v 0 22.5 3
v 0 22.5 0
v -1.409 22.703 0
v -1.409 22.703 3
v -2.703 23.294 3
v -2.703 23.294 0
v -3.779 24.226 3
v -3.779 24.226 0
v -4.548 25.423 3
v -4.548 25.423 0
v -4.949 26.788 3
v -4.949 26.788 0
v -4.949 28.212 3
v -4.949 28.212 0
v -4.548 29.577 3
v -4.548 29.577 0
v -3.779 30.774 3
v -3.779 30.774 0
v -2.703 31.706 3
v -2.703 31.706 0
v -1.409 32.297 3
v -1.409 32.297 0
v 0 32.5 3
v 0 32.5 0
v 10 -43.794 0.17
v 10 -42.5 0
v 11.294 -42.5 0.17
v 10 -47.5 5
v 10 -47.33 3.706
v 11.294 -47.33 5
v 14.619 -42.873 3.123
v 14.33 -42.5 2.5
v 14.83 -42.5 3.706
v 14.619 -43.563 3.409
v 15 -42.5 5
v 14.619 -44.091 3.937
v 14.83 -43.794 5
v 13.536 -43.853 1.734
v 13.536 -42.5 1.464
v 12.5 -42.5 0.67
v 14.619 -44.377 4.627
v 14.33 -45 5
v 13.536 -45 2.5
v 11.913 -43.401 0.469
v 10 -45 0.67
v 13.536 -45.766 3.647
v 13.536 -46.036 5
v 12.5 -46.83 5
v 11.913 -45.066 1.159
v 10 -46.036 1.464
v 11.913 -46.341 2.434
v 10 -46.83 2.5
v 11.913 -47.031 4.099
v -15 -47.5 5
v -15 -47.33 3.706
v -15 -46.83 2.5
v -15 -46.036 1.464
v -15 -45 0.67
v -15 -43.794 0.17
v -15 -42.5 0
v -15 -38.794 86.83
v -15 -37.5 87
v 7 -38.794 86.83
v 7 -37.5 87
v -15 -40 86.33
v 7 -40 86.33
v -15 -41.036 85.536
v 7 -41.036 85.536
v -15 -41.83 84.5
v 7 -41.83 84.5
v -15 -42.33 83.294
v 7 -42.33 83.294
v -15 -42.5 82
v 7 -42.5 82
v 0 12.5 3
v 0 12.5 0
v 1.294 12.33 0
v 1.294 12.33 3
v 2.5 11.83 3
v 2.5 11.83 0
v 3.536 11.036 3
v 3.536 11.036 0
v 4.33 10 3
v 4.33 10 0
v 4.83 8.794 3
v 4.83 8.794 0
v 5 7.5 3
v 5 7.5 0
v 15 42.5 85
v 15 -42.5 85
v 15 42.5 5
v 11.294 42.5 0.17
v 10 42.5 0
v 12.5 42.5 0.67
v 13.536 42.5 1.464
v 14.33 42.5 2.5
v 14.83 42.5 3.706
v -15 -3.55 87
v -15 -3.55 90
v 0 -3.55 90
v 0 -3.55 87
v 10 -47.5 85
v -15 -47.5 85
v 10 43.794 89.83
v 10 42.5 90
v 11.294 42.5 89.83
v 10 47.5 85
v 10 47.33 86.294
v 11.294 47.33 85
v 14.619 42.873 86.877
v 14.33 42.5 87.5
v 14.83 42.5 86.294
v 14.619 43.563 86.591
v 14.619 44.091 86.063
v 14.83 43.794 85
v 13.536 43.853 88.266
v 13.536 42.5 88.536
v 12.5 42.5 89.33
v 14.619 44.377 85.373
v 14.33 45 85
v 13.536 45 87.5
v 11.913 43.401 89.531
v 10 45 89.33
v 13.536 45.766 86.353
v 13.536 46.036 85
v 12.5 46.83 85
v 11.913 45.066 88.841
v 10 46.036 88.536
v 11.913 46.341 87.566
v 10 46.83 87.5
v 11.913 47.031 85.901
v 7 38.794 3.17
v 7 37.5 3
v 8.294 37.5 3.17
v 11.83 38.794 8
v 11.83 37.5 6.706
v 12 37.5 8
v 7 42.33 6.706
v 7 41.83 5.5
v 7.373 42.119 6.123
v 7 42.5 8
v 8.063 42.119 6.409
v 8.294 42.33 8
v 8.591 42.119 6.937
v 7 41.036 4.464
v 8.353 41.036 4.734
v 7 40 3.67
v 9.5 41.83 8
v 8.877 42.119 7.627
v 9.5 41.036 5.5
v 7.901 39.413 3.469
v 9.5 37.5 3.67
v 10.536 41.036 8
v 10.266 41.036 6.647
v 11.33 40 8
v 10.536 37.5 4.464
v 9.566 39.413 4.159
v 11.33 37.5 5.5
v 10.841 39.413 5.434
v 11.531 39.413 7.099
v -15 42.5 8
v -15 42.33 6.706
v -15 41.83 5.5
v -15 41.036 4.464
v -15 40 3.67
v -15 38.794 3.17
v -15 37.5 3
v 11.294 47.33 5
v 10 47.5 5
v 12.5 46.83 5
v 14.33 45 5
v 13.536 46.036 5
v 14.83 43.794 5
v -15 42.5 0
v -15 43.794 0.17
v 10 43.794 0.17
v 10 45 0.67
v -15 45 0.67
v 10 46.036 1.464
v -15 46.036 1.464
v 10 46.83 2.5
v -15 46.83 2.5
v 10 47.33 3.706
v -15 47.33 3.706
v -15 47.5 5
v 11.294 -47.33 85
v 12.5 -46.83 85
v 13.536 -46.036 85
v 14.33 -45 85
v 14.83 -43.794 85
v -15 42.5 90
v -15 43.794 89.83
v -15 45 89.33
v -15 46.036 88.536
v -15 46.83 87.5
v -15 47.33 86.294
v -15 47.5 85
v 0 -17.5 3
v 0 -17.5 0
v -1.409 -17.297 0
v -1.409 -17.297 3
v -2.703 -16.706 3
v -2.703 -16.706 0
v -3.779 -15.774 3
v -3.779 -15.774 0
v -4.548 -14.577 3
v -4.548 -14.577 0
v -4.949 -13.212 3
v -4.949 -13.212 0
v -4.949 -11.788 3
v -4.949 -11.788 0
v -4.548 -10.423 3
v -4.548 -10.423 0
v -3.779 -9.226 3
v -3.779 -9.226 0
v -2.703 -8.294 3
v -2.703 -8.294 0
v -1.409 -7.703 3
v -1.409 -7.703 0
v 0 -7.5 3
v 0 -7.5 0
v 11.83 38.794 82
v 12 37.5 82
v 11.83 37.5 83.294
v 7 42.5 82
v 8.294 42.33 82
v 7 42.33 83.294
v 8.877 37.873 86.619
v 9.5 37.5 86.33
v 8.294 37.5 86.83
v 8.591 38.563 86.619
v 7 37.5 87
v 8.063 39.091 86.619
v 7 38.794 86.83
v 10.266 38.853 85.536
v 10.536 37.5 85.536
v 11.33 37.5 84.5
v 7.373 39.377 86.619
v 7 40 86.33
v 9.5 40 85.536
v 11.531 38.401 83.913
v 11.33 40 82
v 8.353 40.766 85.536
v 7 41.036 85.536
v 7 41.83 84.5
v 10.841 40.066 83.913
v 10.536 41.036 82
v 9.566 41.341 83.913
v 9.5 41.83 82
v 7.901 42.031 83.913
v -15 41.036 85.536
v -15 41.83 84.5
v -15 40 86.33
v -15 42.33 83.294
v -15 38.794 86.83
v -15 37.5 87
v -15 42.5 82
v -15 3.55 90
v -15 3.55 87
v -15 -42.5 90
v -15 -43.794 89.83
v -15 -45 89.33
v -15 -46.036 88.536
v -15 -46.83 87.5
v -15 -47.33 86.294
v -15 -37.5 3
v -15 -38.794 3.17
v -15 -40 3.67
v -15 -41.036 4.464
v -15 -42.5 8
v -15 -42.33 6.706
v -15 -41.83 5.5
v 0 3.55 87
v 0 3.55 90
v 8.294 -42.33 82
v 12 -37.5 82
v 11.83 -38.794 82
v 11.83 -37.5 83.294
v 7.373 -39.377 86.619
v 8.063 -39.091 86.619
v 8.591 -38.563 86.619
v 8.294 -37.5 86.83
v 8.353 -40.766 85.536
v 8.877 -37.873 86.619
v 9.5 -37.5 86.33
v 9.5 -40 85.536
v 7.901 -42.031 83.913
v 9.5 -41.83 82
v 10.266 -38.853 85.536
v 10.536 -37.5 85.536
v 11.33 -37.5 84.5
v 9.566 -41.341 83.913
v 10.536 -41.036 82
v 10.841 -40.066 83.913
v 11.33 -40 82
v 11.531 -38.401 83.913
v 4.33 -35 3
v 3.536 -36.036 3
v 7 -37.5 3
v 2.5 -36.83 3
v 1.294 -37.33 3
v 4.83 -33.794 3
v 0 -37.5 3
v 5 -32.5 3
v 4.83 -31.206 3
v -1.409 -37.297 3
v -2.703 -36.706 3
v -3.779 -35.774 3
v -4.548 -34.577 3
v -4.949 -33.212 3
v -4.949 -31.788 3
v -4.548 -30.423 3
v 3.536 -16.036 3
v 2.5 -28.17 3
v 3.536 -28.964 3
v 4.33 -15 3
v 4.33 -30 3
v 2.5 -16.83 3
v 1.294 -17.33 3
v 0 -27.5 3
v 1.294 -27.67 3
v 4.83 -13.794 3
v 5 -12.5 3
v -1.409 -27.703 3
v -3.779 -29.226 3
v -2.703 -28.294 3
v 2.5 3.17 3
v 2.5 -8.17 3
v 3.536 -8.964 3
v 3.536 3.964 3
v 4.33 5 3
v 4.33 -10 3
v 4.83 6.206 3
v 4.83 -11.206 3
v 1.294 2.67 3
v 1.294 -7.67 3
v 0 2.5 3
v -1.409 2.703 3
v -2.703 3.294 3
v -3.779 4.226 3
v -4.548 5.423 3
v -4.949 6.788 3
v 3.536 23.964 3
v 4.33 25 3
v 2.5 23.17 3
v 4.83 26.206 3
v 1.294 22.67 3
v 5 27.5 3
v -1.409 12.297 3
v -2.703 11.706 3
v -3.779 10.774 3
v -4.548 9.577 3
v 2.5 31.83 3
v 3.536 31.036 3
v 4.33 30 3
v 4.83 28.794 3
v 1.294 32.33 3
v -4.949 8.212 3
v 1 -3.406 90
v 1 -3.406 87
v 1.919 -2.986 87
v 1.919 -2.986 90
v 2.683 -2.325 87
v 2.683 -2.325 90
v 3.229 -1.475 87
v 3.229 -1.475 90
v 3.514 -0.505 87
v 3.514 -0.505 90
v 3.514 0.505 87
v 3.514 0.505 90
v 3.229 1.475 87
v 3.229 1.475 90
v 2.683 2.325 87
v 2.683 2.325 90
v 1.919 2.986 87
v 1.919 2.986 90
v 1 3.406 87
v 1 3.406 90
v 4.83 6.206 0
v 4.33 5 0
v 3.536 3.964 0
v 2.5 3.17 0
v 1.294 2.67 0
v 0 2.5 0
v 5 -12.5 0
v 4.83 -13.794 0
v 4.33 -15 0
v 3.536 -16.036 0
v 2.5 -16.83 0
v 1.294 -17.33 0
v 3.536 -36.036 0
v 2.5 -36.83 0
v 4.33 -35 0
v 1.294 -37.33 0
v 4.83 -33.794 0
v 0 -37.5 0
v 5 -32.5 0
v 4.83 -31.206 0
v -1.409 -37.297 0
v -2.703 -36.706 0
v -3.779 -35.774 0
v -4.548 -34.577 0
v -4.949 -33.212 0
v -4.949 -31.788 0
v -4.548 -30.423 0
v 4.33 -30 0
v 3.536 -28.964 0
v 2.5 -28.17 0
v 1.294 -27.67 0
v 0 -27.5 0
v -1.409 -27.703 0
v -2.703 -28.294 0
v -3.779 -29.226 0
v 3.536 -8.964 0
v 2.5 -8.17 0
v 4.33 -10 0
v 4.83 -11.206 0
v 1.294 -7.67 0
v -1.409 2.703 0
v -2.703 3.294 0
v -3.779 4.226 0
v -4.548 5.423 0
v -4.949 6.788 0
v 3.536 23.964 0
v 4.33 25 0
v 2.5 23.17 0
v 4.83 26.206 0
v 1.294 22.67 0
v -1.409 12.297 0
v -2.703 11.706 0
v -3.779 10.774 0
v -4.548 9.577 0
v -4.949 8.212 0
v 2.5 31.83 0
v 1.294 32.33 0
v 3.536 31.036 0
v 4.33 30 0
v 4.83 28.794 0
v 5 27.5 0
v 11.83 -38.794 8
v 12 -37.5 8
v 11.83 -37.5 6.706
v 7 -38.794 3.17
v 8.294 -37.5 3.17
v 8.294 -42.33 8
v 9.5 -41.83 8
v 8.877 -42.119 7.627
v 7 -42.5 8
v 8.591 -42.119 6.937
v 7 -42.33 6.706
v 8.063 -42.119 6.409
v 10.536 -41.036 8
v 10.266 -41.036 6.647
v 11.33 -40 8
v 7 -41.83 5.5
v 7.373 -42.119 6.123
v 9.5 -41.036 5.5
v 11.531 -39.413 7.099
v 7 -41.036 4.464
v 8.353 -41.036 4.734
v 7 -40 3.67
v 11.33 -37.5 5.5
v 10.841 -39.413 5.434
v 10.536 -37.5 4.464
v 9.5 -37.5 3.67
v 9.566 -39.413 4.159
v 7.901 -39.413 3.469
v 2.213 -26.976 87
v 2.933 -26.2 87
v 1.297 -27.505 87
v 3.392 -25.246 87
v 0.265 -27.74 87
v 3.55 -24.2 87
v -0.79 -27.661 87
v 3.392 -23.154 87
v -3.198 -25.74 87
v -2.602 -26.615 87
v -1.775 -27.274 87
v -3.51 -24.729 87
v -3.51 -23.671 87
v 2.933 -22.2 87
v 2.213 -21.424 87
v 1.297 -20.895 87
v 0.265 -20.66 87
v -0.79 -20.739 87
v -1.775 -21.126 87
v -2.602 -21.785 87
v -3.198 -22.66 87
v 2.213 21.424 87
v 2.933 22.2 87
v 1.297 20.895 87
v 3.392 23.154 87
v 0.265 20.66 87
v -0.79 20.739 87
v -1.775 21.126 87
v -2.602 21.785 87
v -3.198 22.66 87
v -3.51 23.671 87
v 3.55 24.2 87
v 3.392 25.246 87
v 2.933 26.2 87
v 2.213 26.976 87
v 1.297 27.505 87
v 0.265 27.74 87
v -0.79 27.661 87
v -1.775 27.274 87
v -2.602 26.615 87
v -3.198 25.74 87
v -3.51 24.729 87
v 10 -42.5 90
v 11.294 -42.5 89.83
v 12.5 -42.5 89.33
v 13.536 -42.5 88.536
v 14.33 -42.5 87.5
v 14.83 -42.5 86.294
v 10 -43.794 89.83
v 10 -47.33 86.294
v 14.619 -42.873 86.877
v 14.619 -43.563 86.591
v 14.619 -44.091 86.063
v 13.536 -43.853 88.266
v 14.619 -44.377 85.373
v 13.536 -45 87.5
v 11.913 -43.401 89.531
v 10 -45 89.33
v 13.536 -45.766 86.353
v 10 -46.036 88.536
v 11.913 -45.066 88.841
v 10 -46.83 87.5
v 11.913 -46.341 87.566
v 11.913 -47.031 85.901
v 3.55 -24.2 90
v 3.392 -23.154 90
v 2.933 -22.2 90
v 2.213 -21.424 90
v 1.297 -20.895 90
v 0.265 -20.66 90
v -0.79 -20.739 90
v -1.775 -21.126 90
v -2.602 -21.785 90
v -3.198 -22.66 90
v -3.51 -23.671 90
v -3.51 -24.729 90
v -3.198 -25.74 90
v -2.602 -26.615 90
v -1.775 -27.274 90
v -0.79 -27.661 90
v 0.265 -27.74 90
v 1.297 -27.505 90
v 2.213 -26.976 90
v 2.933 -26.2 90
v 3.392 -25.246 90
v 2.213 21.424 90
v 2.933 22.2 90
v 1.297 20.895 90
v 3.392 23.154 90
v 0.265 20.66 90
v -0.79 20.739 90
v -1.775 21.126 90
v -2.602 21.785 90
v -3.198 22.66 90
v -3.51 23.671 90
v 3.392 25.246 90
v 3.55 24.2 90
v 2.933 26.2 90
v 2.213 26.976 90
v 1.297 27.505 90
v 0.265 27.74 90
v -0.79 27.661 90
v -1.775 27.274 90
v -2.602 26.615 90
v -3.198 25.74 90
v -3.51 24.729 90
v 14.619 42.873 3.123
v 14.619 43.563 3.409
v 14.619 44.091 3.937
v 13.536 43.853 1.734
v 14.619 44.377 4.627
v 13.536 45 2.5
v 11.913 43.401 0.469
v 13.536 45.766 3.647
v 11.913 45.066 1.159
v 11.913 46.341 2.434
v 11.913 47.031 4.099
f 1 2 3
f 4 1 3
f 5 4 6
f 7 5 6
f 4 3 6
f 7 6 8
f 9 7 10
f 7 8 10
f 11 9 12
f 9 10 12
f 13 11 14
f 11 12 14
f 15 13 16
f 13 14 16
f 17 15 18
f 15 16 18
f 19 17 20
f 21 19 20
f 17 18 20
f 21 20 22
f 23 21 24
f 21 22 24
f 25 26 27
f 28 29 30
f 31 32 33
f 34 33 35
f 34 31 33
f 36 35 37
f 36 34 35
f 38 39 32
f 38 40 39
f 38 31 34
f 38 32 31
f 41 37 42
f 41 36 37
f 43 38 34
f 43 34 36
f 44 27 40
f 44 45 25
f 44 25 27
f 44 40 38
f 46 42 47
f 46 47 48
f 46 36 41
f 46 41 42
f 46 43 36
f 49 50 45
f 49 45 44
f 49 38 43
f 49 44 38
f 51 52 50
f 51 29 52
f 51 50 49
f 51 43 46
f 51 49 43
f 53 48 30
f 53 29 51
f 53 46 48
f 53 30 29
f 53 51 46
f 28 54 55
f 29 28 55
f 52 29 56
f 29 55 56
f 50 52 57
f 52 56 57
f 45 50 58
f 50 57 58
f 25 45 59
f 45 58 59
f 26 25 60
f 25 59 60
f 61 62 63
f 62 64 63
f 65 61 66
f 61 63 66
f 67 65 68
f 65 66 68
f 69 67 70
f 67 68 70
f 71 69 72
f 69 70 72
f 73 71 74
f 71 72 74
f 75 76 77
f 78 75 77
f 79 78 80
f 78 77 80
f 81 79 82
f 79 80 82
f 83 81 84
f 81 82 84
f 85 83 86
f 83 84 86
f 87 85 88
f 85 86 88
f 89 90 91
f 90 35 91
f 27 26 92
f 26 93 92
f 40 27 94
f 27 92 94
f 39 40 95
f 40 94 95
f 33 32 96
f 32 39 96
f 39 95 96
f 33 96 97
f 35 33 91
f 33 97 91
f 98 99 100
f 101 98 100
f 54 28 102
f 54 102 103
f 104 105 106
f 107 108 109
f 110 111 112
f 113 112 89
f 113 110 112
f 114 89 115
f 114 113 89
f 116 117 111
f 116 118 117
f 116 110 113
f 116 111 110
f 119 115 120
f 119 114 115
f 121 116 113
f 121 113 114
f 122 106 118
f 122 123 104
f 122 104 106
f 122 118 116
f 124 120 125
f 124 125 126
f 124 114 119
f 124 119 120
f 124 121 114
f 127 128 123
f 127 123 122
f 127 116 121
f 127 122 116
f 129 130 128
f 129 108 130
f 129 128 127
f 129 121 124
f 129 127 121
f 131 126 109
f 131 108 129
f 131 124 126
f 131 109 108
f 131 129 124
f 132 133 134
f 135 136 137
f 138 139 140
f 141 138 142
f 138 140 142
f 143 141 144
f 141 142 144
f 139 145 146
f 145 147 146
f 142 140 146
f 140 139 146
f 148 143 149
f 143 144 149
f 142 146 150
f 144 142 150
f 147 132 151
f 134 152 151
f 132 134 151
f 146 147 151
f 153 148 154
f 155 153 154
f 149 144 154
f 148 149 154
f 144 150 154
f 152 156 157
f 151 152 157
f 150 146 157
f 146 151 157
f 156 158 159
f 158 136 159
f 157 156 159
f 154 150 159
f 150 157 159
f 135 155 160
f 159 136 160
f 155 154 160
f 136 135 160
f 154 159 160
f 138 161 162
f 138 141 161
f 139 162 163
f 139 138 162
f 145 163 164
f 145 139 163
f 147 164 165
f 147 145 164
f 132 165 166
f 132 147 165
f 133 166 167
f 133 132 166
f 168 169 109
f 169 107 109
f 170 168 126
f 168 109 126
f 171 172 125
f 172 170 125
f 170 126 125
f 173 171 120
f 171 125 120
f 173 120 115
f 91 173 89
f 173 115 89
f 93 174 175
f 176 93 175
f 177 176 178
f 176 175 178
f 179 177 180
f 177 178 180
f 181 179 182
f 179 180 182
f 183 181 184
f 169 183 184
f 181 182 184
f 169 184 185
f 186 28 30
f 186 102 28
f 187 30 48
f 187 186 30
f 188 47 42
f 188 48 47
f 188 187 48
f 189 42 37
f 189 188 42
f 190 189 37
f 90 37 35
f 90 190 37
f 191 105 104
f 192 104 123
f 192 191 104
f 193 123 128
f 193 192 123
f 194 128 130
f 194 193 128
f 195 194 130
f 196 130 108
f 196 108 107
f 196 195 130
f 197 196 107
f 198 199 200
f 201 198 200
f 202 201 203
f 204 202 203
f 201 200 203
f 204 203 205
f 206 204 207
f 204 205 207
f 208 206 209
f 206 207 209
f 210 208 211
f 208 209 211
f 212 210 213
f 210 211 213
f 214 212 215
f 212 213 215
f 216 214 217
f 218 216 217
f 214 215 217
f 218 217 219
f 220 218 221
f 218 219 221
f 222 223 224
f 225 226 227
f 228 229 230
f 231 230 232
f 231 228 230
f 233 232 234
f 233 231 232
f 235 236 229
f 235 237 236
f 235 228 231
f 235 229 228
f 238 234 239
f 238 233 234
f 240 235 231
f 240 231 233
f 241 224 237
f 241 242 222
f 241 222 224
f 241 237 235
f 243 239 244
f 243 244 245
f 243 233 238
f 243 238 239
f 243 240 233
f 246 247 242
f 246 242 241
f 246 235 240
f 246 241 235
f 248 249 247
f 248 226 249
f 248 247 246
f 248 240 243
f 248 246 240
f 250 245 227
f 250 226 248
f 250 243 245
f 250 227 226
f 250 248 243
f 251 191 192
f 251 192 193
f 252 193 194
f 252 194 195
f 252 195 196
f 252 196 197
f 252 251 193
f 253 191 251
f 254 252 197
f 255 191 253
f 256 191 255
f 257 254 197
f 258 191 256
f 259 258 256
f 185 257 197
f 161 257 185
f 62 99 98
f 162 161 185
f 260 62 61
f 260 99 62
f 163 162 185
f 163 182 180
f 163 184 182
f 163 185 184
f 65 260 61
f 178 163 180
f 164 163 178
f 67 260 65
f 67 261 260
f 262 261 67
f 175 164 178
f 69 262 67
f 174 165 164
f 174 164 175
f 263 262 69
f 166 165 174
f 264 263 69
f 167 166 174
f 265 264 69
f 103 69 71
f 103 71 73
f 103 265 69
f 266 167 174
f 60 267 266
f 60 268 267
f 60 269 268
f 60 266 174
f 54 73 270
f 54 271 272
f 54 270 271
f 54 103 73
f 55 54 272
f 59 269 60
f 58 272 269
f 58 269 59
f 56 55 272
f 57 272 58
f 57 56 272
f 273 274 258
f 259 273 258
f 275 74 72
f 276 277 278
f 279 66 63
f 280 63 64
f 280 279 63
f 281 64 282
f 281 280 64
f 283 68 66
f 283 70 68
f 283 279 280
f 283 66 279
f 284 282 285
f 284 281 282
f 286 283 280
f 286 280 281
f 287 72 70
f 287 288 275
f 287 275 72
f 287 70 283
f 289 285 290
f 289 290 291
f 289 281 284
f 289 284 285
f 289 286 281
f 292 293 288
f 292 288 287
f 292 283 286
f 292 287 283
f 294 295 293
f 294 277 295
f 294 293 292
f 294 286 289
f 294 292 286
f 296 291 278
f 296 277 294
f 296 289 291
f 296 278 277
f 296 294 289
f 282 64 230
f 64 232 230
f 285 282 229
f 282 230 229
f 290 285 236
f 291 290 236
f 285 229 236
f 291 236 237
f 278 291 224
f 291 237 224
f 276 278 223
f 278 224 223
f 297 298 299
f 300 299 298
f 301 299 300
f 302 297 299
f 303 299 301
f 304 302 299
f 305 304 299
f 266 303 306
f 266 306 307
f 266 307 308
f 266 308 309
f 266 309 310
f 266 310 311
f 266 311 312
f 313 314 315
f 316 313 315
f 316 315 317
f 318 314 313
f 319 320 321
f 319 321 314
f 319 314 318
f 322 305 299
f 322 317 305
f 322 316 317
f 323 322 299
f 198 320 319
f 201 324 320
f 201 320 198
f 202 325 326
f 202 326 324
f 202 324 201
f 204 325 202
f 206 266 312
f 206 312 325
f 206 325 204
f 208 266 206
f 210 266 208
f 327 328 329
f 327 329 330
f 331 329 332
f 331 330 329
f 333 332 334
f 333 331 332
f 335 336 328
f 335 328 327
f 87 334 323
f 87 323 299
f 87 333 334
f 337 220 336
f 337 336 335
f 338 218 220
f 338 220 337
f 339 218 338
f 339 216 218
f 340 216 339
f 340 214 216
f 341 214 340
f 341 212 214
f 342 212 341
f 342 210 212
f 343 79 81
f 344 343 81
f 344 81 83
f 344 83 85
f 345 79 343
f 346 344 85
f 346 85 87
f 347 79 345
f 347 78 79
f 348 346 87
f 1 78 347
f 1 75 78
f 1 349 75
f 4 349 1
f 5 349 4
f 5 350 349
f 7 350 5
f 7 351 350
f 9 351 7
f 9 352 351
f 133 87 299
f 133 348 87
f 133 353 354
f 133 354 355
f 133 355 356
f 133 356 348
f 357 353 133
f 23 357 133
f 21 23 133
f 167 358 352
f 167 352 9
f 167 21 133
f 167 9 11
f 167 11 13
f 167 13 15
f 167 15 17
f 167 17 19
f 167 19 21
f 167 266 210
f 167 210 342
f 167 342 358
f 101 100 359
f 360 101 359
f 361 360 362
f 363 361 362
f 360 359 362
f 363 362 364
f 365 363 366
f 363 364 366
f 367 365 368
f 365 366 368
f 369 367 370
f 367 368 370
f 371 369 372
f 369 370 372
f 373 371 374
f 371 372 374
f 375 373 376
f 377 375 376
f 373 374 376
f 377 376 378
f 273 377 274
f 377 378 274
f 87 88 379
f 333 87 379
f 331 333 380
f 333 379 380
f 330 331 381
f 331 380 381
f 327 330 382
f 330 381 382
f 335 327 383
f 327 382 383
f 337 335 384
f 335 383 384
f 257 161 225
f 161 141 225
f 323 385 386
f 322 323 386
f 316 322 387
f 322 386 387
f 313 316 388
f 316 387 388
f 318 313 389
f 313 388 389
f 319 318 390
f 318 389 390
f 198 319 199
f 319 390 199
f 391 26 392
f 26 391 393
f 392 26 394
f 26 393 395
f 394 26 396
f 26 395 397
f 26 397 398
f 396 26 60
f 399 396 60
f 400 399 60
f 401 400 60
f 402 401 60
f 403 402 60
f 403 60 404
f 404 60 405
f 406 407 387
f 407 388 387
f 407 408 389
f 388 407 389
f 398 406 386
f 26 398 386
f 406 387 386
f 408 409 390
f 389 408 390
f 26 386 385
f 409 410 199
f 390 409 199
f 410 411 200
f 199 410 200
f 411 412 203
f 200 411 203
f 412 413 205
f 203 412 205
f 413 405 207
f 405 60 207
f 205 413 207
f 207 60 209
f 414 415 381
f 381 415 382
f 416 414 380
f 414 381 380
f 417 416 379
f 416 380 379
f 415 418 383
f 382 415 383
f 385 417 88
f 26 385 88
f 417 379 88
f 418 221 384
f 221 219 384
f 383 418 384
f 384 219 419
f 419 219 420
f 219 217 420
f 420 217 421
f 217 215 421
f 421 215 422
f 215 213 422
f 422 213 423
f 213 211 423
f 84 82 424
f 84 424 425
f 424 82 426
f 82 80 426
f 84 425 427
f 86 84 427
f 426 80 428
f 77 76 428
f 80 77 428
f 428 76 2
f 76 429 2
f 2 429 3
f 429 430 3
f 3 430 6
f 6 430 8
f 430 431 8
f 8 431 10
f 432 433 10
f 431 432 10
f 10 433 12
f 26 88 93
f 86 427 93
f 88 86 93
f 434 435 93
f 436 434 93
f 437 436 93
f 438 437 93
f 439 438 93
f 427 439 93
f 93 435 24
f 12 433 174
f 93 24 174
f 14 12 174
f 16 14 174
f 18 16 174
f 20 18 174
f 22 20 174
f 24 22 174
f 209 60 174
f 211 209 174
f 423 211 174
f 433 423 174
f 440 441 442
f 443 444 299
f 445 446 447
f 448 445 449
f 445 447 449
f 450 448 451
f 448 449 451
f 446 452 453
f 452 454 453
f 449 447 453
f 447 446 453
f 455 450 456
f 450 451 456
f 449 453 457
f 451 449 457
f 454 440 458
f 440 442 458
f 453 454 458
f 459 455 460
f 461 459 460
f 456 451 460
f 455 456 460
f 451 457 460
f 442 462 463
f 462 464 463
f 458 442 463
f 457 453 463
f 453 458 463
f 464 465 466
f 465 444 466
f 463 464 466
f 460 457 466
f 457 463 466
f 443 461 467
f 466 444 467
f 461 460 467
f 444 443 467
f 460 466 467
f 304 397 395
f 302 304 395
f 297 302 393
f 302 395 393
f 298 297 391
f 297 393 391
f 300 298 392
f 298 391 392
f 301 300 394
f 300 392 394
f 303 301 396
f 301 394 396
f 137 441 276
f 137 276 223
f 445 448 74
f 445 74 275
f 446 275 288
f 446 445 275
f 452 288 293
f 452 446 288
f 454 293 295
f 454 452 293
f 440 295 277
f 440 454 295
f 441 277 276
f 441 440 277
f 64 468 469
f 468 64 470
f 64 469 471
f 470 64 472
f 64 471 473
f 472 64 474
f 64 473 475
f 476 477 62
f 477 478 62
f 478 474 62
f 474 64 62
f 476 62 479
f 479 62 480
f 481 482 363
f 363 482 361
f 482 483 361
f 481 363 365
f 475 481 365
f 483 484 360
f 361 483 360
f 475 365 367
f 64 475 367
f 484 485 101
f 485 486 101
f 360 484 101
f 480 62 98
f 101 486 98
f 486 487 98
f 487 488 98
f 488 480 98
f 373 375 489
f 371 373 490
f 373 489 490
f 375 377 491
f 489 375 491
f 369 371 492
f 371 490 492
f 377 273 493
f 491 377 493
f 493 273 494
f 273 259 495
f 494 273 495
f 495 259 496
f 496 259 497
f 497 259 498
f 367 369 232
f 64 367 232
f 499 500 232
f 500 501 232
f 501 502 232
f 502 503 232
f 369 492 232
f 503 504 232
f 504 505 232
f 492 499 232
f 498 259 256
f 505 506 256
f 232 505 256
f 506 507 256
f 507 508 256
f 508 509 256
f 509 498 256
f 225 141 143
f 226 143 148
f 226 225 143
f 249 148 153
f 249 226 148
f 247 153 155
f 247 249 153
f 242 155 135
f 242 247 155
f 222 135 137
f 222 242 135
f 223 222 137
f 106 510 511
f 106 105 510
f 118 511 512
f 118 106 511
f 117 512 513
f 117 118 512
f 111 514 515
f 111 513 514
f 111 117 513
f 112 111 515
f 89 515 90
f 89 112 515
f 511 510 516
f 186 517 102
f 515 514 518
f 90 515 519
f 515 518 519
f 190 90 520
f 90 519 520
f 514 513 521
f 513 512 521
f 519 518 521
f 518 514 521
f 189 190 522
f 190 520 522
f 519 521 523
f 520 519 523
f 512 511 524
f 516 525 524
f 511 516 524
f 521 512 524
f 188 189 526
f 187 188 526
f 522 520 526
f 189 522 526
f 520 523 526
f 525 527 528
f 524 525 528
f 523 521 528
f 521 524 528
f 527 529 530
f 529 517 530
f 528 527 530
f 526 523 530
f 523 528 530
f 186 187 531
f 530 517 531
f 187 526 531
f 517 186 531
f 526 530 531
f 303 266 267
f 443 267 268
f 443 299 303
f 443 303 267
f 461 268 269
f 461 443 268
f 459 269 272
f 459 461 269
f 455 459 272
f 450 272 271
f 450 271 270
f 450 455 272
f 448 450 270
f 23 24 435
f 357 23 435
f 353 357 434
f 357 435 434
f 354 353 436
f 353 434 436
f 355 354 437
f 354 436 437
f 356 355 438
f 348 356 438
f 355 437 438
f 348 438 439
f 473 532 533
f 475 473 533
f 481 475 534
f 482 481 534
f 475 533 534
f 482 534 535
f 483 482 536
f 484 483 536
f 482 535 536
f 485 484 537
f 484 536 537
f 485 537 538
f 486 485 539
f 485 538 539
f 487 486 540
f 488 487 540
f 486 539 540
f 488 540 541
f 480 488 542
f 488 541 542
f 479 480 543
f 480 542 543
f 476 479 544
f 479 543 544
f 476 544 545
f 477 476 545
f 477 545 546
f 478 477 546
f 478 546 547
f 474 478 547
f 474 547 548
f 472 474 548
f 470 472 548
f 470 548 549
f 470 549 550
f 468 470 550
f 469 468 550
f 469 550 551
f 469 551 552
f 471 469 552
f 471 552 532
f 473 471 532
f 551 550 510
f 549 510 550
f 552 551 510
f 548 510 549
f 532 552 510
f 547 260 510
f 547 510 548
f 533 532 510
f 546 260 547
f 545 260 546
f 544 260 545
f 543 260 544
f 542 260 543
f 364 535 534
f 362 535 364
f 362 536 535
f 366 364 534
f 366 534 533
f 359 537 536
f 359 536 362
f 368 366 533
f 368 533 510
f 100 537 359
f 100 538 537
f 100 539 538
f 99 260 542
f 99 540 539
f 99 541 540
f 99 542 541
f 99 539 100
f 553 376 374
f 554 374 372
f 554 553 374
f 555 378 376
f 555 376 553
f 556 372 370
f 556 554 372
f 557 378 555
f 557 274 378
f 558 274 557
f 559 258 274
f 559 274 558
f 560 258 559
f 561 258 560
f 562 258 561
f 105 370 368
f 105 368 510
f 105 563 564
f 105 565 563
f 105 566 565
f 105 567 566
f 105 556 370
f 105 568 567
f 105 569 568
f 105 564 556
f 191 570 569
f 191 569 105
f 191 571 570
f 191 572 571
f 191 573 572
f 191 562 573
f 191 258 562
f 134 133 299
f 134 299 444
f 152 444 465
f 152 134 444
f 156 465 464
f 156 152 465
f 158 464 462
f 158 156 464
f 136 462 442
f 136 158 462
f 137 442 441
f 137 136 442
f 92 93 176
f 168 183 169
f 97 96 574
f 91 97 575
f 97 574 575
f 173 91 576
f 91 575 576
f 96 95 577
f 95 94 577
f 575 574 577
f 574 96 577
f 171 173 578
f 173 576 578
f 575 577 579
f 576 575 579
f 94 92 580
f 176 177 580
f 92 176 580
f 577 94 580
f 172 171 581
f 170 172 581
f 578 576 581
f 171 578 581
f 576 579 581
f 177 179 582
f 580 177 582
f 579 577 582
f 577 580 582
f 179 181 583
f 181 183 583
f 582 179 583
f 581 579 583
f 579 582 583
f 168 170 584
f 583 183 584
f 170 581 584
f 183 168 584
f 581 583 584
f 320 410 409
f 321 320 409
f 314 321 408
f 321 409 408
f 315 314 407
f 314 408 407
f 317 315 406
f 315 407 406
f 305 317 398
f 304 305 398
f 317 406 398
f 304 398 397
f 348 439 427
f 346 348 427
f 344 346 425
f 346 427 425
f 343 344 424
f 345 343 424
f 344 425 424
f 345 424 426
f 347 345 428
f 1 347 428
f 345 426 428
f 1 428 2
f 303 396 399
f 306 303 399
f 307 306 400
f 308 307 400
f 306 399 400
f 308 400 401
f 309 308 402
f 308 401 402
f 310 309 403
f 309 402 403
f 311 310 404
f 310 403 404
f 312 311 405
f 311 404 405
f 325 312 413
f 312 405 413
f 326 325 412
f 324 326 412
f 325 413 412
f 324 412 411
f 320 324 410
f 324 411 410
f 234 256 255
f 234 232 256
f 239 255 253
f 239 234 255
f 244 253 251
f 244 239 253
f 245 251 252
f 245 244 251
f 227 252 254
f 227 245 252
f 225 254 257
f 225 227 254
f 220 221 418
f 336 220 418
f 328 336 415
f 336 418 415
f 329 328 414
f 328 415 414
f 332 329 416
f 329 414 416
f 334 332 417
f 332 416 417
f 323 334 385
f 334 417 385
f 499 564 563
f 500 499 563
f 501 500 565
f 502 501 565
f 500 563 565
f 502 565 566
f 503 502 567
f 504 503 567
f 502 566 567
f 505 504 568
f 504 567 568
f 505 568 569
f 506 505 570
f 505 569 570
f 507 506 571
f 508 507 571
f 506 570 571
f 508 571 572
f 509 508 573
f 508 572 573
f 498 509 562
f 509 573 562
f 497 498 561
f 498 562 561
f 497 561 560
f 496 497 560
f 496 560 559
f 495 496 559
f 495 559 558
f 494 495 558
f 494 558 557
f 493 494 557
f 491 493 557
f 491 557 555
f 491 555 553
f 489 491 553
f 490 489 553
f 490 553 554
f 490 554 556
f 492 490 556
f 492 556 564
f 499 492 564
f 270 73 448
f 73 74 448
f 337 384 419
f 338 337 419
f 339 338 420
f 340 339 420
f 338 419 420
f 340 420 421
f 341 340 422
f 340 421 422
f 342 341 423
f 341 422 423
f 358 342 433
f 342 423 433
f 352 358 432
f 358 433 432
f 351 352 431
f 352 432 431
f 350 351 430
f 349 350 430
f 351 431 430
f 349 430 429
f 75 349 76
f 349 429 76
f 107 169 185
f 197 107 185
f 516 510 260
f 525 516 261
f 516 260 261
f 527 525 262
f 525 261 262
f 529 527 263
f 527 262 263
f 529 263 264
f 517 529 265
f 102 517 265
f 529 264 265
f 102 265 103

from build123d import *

# Parameters (mm, degrees)
SKETCH1_W                                   = 95
SKETCH1_H                                   = 30
BOSS_EXTRUDE1_DEPTH                         = 90
F_2_MM_TOP_BOT_3_MM_SIDE_T                  = -3
F_2_MM_TOP_BOT_3_MM_SIDE_THICKNESS_2_FACE_W = 84
F_2_MM_TOP_BOT_3_MM_SIDE_THICKNESS_2_FACE_H = 27
F_2_MM_TOP_BOT_3_MM_SIDE_THICKNESS_2_DEPTH  = 2
F_2_MM_TOP_BOT_3_MM_SIDE_THICKNESS_3_FACE_W = 84
F_2_MM_TOP_BOT_3_MM_SIDE_THICKNESS_3_FACE_H = 27
F_2_MM_TOP_BOT_3_MM_SIDE_THICKNESS_3_DEPTH  = 2
SKETCH4_R                                   = 3.55
F_7_1_MM_FIXTURE_HOLES_DEPTH                = 10
F_5_MM_RADIUS_R                             = 5
CUT_EXTRUDE1_DEPTH                          = 10


with BuildPart() as part:
    # Sketch1 → Boss-Extrude1 (new body)
    with BuildSketch(Plane(origin=(0, 0, 0), x_dir=(0, 1, 0), z_dir=(0, 0, 1))):
        Rectangle(SKETCH1_W, SKETCH1_H)
    extrude(amount=BOSS_EXTRUDE1_DEPTH)

    # 2 mm top/bot 3 mm side
    f_2_mm_top_bot_3_mm_side_openings = [part.faces().sort_by_distance(p)[0] for p in [
        (-15, 0, 45),
    ]]
    offset(amount=F_2_MM_TOP_BOT_3_MM_SIDE_T, openings=f_2_mm_top_bot_3_mm_side_openings, kind=Kind.INTERSECTION)

    # 2 mm top/bot 3 mm side thickness 2 face (on inner face of the shell) → 2 mm top/bot 3 mm side thickness 2 (add)
    with BuildSketch(Plane(origin=(-1.5, 44.5, 45), x_dir=(0, 0, 1), z_dir=(0, 1, 0))):
        Rectangle(F_2_MM_TOP_BOT_3_MM_SIDE_THICKNESS_2_FACE_W, F_2_MM_TOP_BOT_3_MM_SIDE_THICKNESS_2_FACE_H)
    extrude(amount=-F_2_MM_TOP_BOT_3_MM_SIDE_THICKNESS_2_DEPTH)

    # 2 mm top/bot 3 mm side thickness 3 face (on inner face of the shell) → 2 mm top/bot 3 mm side thickness 3 (add)
    with BuildSketch(Plane(origin=(-1.5, -44.5, 45), x_dir=(0, 0, -1), z_dir=(0, -1, 0))):
        Rectangle(F_2_MM_TOP_BOT_3_MM_SIDE_THICKNESS_3_FACE_W, F_2_MM_TOP_BOT_3_MM_SIDE_THICKNESS_3_FACE_H)
    extrude(amount=-F_2_MM_TOP_BOT_3_MM_SIDE_THICKNESS_3_DEPTH)

    # Sketch4 → 7.1 mm fixture holes (cut)
    with BuildSketch(Plane.XY.offset(90)):
        with Locations((0, 24.2)):
            Circle(SKETCH4_R)
        Circle(SKETCH4_R)
        with Locations((0, -24.2)):
            Circle(SKETCH4_R)
        with BuildLine():
            ThreePointArc((0, -3.55), (-3.55, 0), (0, 3.55))
            Line((0, 3.55), (-15, 3.55))
            Line((-15, 3.55), (-15, -3.55))
            Line((-15, -3.55), (0, -3.55))
        make_face()
    extrude(amount=-F_7_1_MM_FIXTURE_HOLES_DEPTH, mode=Mode.SUBTRACT)

    # 5 mm radius
    f_5_mm_radius_edges = [part.edges().sort_by_distance(p)[0] for p in [
        (0, 47.5, 90),
        (12, 0, 3),
        (12, -42.5, 45),
        (-1.5, 42.5, 3),
        (12, 42.5, 45),
        (-1.5, -42.5, 87),
        (12, 0, 87),
        (-1.5, 42.5, 87),
        (-1.5, -42.5, 3),
        (0, -47.5, 90),
        (15, 0, 90),
        (0, -47.5, 0),
        (0, 47.5, 0),
        (15, 0, 0),
        (15, -47.5, 45),
        (15, 47.5, 45),
    ]]
    fillet(f_5_mm_radius_edges, radius=F_5_MM_RADIUS_R)

    # Sketch3 → Cut-Extrude1 (cut)
    with BuildSketch(Plane(origin=(0, 0, 0), x_dir=(1, 0, 0), z_dir=(0, 0, -1))):
        with BuildLine():
            ThreePointArc((5, 32.5), (3.535533906, 36.035533906), (0, 37.5))
            Line((0, 37.5), (0, 27.5))
            ThreePointArc((0, 27.5), (3.535533906, 28.964466094), (5, 32.5))
        make_face()
        with BuildLine():
            Line((0, 27.5), (0, 37.5))
            ThreePointArc((0, 37.5), (-5, 32.5), (0, 27.5))
        make_face()
        with BuildLine():
            ThreePointArc((5, 12.5), (3.535533906, 16.035533906), (0, 17.5))
            Line((0, 17.5), (0, 7.5))
            ThreePointArc((0, 7.5), (3.535533906, 8.964466094), (5, 12.5))
        make_face()
        with BuildLine():
            Line((0, 7.5), (0, 17.5))
            ThreePointArc((0, 17.5), (-5, 12.5), (0, 7.5))
        make_face()
        with BuildLine():
            ThreePointArc((5, -7.5), (3.535533906, -3.964466094), (0, -2.5))
            Line((0, -2.5), (0, -12.5))
            ThreePointArc((0, -12.5), (3.535533906, -11.035533906), (5, -7.5))
        make_face()
        with BuildLine():
            Line((0, -12.5), (0, -2.5))
            ThreePointArc((0, -2.5), (-5, -7.5), (0, -12.5))
        make_face()
        with BuildLine():
            ThreePointArc((5, -27.5), (3.535533906, -23.964466094), (0, -22.5))
            Line((0, -22.5), (0, -27.5))
            Line((0, -27.5), (0, -32.5))
            ThreePointArc((0, -32.5), (3.535533906, -31.035533906), (5, -27.5))
        make_face()
        with BuildLine():
            Line((0, -27.5), (0, -22.5))
            ThreePointArc((0, -22.5), (-5, -27.5), (0, -32.5))
            Line((0, -32.5), (0, -27.5))
        make_face()
    extrude(amount=-CUT_EXTRUDE1_DEPTH, mode=Mode.SUBTRACT)


solid = part.part
